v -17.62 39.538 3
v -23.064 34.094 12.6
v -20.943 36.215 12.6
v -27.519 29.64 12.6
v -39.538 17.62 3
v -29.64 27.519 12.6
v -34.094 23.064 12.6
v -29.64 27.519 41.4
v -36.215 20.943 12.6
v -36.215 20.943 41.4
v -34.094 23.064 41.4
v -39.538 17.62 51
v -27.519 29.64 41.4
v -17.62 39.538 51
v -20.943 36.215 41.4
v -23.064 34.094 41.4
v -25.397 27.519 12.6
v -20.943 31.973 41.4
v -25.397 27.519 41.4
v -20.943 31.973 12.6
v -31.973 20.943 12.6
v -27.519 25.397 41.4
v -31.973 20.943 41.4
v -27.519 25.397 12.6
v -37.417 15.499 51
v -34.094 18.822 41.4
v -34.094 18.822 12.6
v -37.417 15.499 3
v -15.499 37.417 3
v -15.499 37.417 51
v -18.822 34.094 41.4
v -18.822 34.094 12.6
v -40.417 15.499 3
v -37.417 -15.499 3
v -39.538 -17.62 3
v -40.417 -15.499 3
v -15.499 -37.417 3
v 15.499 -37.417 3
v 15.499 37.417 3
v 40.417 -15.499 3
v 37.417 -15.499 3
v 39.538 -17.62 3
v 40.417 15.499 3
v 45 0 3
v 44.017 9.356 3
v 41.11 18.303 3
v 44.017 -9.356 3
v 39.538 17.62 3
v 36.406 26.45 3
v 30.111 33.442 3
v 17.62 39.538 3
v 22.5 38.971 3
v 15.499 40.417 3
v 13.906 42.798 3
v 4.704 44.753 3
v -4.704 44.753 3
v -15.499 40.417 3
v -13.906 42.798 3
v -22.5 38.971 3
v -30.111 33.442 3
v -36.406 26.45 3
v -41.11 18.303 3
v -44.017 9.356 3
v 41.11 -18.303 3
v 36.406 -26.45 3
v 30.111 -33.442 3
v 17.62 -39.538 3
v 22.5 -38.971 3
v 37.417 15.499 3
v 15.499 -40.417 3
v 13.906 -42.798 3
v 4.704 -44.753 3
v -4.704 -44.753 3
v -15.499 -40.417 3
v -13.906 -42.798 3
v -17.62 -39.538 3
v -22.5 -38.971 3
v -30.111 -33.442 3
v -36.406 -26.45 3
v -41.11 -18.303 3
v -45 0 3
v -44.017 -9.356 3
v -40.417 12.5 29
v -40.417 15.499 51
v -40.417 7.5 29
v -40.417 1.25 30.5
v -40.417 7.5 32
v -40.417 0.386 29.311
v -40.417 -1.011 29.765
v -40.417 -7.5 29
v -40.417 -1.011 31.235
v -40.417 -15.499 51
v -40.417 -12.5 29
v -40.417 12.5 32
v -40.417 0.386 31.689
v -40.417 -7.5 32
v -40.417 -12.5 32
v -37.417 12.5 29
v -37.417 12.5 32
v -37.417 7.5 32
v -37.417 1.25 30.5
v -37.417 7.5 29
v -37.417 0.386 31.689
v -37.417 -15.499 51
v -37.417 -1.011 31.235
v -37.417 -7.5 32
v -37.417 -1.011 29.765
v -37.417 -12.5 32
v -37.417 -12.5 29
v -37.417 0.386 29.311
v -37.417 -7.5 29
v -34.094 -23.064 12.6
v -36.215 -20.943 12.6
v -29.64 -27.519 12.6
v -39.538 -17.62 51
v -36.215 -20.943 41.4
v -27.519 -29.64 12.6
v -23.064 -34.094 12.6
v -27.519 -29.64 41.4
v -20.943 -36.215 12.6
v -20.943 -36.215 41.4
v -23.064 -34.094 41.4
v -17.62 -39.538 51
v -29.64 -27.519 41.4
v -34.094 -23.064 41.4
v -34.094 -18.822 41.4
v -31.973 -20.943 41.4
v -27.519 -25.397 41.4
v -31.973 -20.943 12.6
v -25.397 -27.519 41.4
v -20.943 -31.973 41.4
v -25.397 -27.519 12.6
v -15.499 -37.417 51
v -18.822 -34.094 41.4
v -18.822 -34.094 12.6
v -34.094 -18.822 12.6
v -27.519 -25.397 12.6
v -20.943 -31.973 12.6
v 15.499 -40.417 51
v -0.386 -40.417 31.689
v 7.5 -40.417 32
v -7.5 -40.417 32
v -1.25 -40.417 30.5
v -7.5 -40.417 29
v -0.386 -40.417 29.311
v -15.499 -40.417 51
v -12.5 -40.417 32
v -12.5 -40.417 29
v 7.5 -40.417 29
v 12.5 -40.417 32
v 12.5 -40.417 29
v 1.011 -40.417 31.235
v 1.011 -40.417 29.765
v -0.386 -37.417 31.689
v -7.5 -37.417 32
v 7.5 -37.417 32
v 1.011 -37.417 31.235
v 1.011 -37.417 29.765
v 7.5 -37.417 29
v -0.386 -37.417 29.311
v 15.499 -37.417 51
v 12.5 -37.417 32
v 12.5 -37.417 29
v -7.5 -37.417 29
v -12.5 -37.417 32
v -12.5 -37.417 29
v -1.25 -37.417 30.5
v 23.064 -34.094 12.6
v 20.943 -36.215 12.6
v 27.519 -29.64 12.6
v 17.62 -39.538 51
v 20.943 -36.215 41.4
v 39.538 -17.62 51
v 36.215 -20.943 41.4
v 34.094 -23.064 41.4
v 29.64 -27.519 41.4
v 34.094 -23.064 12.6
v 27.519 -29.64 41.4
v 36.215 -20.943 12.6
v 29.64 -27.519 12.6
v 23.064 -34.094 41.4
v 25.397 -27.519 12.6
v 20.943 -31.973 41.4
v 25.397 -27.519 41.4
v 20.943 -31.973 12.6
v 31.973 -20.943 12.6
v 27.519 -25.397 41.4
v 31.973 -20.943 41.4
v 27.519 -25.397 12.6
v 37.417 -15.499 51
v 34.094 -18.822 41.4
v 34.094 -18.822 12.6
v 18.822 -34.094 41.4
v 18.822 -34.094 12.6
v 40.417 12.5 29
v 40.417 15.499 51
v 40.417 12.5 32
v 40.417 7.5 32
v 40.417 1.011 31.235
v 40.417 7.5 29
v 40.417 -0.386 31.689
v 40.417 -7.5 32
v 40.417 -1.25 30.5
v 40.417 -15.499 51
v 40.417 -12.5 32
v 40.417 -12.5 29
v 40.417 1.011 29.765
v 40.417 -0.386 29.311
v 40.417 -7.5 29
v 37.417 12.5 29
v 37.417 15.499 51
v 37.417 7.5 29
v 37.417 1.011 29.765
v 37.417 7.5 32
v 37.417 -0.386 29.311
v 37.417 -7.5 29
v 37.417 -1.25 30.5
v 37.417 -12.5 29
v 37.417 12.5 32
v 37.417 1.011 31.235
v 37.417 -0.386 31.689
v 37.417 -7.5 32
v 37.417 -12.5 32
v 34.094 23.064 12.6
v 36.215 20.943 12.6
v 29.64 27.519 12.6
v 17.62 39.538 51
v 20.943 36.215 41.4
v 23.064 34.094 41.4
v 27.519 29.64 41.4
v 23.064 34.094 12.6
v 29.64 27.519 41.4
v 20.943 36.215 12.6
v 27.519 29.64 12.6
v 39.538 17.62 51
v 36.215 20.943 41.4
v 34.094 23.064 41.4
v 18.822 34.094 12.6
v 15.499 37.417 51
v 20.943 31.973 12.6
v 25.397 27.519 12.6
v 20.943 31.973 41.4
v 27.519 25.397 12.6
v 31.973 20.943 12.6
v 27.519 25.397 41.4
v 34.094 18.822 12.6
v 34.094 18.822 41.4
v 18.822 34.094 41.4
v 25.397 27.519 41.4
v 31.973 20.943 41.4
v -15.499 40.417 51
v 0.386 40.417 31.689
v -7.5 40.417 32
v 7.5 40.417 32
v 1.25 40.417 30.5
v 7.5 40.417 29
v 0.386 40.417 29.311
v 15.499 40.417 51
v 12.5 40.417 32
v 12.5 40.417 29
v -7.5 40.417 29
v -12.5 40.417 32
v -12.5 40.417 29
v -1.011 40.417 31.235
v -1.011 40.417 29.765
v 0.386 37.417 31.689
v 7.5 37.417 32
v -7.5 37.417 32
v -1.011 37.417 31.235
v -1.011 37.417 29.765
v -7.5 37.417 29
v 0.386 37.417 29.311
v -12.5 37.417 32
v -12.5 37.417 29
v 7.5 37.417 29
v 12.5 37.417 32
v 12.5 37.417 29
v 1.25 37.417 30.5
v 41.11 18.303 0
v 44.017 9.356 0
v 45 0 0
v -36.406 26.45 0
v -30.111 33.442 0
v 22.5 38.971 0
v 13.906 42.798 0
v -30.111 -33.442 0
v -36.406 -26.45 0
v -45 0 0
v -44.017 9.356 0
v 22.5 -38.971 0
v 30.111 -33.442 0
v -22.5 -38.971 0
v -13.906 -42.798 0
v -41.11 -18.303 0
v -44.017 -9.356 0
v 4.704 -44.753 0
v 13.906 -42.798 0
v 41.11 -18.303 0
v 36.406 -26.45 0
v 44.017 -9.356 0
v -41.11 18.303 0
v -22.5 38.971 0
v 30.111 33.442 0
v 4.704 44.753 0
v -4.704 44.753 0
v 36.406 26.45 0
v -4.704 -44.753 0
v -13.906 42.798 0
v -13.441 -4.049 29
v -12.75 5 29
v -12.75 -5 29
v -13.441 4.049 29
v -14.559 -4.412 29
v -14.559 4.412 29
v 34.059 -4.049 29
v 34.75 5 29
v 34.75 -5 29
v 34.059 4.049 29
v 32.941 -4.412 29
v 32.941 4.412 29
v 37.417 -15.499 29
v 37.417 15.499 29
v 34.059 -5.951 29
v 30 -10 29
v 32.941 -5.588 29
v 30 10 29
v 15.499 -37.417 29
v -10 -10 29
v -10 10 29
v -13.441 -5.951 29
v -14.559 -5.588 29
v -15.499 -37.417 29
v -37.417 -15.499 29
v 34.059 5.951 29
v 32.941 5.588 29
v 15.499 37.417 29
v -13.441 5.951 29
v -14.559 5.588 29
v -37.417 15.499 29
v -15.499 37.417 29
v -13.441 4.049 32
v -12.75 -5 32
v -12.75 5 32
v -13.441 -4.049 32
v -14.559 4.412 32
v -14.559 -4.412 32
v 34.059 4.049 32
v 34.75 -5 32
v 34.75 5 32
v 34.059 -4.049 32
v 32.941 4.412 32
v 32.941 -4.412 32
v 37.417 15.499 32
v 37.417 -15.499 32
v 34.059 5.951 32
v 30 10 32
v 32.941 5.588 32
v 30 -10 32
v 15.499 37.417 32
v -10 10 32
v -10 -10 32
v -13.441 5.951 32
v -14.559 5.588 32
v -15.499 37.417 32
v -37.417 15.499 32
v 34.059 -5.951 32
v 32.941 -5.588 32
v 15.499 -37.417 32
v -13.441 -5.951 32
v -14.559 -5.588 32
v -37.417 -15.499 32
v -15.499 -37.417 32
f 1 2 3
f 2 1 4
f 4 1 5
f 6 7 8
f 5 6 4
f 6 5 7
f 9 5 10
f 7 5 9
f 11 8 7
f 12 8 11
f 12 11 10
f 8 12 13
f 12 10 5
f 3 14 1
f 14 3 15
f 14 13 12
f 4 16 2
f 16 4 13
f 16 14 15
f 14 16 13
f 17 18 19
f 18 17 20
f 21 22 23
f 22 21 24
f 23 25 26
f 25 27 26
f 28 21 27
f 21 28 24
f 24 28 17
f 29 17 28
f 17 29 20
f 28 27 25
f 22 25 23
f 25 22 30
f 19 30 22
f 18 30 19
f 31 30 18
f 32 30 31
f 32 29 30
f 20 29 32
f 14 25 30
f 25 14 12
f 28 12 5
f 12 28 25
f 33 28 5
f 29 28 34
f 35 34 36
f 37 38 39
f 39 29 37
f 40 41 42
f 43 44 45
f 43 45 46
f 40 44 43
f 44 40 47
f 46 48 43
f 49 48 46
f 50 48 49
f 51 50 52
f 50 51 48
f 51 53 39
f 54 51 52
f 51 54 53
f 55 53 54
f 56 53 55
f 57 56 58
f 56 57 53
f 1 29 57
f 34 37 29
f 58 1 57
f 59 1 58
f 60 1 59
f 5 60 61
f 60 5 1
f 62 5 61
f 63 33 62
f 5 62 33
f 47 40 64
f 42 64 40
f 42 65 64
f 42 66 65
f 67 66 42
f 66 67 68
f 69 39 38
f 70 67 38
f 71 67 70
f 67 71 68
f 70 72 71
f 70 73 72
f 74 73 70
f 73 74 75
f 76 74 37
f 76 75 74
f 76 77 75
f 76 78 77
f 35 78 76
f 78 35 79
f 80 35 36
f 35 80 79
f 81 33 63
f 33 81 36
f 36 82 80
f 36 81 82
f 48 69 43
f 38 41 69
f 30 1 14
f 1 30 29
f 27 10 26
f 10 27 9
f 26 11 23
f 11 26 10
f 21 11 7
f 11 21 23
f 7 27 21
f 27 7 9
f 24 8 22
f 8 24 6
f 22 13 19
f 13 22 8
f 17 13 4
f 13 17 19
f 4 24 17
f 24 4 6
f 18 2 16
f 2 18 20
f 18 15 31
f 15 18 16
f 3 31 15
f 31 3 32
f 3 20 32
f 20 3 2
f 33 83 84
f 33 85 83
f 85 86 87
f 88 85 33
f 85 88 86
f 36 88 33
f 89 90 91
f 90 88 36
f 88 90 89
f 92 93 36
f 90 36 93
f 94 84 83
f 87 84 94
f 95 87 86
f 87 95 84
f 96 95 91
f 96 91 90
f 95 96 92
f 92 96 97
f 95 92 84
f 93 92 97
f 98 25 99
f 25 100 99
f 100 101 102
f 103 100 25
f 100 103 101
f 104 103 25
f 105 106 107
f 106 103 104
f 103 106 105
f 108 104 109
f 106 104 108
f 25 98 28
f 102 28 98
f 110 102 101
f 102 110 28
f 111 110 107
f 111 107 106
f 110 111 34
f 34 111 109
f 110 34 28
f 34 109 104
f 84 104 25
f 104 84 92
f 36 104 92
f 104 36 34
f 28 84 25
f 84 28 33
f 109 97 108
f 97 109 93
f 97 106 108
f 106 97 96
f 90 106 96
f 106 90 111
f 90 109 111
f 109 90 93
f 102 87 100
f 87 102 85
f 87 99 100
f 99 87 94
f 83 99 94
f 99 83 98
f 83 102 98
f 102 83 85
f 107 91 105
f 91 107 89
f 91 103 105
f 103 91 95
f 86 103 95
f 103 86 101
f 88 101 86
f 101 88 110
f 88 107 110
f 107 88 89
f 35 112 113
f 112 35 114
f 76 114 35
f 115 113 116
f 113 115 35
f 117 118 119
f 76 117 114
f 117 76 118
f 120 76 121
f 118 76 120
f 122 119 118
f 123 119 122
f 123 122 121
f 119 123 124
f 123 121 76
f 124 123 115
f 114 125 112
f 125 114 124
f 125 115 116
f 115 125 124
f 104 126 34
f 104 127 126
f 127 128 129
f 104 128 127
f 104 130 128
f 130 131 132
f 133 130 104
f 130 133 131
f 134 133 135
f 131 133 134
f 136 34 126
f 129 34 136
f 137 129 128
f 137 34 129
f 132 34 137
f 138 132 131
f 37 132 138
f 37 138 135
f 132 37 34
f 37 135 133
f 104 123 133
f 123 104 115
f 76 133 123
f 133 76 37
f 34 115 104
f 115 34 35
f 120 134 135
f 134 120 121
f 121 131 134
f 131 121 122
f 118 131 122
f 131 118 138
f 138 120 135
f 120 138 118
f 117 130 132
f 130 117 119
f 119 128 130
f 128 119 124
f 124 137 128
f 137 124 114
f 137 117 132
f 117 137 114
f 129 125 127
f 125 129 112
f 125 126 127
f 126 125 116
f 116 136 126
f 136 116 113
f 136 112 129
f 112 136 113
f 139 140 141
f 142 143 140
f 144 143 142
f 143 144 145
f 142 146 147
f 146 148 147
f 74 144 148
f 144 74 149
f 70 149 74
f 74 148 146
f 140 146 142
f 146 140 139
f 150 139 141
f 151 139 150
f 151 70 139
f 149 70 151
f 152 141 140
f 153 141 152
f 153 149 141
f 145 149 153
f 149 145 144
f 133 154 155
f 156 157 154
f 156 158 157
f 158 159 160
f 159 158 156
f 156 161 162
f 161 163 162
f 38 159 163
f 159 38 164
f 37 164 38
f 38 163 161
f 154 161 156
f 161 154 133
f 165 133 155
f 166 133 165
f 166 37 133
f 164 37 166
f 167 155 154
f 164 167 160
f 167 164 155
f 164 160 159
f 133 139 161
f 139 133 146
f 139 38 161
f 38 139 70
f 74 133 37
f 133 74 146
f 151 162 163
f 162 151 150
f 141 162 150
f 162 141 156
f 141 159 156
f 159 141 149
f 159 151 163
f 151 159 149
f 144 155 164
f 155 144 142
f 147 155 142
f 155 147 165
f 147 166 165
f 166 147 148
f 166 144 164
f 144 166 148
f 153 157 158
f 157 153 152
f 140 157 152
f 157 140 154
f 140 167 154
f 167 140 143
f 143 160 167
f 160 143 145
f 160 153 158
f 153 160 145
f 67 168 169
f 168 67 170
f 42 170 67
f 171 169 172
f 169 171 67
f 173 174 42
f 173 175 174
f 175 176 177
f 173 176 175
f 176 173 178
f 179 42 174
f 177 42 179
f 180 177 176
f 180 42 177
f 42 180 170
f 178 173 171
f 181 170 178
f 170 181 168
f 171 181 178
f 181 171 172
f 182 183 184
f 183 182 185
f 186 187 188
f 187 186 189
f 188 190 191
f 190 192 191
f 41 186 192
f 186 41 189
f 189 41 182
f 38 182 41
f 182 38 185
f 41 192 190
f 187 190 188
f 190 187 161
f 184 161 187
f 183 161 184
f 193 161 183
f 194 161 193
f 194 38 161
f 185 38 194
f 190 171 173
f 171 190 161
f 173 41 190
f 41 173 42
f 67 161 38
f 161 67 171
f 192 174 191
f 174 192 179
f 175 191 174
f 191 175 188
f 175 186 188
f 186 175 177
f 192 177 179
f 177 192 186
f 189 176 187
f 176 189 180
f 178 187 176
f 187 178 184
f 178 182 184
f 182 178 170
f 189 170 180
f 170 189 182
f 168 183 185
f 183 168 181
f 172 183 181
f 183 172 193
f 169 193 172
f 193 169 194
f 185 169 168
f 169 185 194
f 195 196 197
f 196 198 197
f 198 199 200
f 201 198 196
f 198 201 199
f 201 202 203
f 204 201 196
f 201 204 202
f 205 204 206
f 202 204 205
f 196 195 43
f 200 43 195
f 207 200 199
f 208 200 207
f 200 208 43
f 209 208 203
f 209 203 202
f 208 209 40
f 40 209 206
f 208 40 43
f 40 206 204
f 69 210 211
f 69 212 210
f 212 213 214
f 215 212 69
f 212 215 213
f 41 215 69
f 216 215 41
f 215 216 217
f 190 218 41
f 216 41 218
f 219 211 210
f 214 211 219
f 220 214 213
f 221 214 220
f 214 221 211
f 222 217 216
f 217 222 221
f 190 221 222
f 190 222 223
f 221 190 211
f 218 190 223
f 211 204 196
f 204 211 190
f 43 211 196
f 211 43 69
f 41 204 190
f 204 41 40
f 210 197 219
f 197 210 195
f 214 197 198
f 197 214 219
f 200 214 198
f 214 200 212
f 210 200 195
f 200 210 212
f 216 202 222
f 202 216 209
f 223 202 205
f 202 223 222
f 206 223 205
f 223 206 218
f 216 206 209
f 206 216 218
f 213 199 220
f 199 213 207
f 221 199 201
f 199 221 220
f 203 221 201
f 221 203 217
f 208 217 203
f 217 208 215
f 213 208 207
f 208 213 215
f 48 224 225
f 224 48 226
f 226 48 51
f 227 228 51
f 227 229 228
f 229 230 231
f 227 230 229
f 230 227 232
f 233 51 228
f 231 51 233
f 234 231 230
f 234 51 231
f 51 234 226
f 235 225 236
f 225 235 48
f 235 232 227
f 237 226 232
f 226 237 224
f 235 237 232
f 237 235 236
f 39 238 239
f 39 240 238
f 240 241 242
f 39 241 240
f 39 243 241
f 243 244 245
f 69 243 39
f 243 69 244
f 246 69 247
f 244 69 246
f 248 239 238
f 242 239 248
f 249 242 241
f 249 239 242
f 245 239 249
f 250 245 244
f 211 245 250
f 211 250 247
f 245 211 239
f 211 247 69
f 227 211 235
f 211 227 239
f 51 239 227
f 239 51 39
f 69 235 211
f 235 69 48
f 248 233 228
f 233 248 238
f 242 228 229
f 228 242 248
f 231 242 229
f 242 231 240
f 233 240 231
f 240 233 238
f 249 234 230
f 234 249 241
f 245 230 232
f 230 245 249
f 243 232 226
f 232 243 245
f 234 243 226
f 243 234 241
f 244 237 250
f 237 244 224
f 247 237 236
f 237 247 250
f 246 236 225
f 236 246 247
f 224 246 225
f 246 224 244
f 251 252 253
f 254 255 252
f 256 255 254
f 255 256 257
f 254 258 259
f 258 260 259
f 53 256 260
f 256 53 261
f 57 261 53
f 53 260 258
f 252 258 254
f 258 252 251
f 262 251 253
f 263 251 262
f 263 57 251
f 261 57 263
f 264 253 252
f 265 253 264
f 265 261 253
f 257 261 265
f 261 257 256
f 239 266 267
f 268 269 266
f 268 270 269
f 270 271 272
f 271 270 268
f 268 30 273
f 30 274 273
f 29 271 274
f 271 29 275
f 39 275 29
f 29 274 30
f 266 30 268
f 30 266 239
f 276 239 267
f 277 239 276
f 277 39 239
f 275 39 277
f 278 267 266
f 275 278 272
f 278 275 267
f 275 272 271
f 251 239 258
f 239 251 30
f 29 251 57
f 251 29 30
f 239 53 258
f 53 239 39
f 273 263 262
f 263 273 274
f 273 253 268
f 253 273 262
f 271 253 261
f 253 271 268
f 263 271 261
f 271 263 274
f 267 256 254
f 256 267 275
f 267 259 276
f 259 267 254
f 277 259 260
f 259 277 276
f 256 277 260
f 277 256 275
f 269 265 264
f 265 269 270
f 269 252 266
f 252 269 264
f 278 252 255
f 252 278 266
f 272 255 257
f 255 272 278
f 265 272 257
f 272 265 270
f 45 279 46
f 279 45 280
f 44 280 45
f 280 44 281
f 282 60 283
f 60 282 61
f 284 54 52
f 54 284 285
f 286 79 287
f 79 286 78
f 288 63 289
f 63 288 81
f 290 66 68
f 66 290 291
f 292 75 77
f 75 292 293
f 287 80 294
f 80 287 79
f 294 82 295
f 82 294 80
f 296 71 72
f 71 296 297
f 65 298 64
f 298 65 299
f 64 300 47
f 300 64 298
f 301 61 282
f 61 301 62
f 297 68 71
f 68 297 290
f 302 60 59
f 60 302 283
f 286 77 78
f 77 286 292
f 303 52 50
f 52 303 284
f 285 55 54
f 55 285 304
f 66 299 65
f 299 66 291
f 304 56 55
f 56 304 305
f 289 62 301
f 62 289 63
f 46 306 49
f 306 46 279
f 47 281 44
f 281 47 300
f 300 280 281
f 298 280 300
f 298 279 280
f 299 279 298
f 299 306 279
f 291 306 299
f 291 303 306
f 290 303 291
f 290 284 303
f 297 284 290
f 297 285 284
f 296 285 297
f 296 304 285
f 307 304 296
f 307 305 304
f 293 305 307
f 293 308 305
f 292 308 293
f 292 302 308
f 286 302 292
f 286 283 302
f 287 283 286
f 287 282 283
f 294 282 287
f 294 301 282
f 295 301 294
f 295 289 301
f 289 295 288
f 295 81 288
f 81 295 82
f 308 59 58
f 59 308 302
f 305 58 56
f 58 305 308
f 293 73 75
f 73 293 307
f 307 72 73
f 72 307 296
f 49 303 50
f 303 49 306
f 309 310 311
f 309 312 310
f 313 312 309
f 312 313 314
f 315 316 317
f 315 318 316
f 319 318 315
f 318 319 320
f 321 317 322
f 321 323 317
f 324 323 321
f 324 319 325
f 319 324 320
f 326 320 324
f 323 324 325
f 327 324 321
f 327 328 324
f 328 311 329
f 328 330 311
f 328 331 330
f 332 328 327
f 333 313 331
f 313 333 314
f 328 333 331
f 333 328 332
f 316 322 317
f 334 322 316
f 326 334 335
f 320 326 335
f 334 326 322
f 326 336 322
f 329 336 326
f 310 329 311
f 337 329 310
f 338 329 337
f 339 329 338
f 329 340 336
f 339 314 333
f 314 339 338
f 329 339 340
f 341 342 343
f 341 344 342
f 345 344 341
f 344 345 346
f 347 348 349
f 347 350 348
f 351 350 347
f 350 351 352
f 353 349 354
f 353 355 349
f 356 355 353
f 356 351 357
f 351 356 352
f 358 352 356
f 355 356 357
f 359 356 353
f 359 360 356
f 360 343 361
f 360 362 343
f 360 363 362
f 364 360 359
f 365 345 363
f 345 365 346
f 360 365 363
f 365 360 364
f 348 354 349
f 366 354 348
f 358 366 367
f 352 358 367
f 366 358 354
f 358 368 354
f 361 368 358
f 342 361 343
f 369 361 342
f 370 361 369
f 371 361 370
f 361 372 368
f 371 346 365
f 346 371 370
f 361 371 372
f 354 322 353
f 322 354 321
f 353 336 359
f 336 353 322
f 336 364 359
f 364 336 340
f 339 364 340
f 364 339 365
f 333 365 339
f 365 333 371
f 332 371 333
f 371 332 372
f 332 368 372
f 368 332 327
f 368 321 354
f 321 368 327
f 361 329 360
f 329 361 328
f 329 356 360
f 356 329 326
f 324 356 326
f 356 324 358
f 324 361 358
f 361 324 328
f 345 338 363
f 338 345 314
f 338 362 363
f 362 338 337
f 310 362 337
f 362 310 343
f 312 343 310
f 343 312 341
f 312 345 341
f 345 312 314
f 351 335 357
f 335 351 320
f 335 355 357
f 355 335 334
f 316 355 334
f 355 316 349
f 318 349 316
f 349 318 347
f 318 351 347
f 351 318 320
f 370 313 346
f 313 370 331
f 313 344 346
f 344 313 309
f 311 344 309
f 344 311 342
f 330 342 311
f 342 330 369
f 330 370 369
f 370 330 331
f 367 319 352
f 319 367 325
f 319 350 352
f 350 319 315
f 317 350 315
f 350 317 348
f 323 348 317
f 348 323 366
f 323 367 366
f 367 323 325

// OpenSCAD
// file: ../connectors/captive_nut.scad
module nut_slot() {
    
}

module bolt_slot(height, width, translation, circle_dia) {
    circle(d=circle_dia);
    for (i = [-1:2:1]) {
        translate([i*translation, 0, 0]) square([width, height], center=true);
    }
}

bolt_slot(3, 5, 10, 2.5);
// file: side_plate.scad
use <../connectors/captive_nut.scad>

// Side plates for the base

air_holes_length = 0.6; // percentage of total length for holes
air_holes_width = 0.6; // percentage of plate width for holes
air_holes_thickness = 3; // width of holes

module side_plate(tk, width, height, num_plates, air_holes_num, servo_height) {
    height = height - tk;
    air_holes_num = air_holes_num - 1;
    linear_extrude(tk) difference() {
        square([width, height], center = false);

        if (air_holes_num > 0) {
            start = width * (1 - air_holes_width) / 2;
            end = start + width * air_holes_width;
            vertical_offset = height / 2;
    
            for (i = [start:(end-start)/air_holes_num:end + 1]) {
                translate([i, vertical_offset])
                square([air_holes_thickness, height*air_holes_length], center = true);
            }
        } else {
            translate([width/2, servo_height, 0]) bolt_slot(tk, 5, 10, 2.5);
        }
    }
}

side_plate(3, 90, 70, 8, 0, 40);
// file: middle_base_plate.scad
use <../connectors/captive_nut.scad>

module middle_base_plate(tk, num_plates, diameter, hole_length, hole_width, shaft_offset, servo_length, screw_diameter) {
    echo(concat(tk, num_plates, diameter, hole_length, hole_width, shaft_offset, servo_length, screw_diameter));
    linear_extrude(3) difference() {
        rotate([0,0,360/num_plates/2]) circle(d=diameter, $fn=num_plates);
        translate([shaft_offset, 0, 0]) square([hole_length, hole_width], center=true);
        for (i = [-1:2:1]) {
            for (j = [-1:2:1]) {
                translate([shaft_offset + i*hole_length/2 + i*(servo_length - hole_length)/4, j*hole_width/4]) circle(d=screw_diameter);
            }
        }
    }
}

middle_base_plate(3, 8, 81, 40, 20, 10, 55, 3);
// file: top_base_plate.scad
// Top base plate

module top_base_plate(tk, dia) {
    linear_extrude(tk) circle(d=dia);
}
// file: bottom_base_plate.scad
// Bottom base plate

module bottom_base_plate(tk, dia) {
    linear_extrude(tk) circle(d=dia);
}
// main file
use <bottom_base_plate.scad>
use <top_base_plate.scad>
use <middle_base_plate.scad>
use <side_plate.scad>

height_offset = 10;
side_plate_diameter_offset = 0.9; // percentage offset of interior plates

module base(plate, tk, diameter, servo, num_plates, air_holes_num, bolt_diameter) {
    if (plate) {
        projection() {
            bottom_base_plate(tk, diameter);
            translate([100, 0, 0]) top_base_plate(tk, diameter);
        }
    } else {
        plate_height = servo[0] + height_offset;
        side_plate_width = sin(180/num_plates) * diameter * side_plate_diameter_offset;
        side_plate_offset = cos(180/num_plates) * diameter * side_plate_diameter_offset /2 + tk;
        
        bottom_base_plate(tk, diameter); // place bottom plate
        
        for (i = [1:num_plates]) {
            rotate([0,0,360/num_plates*i])
            translate([-side_plate_width/2,side_plate_offset,tk])
            rotate([90,0,0])
            if (floor(i/2) == i/2) {
                // if even
                side_plate(tk, side_plate_width, plate_height, num_plates, 0, servo[5] + tk/2);
            } else {
                // if odd
                side_plate(tk, side_plate_width, plate_height, num_plates, air_holes_num, servo[5]);
            }
        }
        
        translate([0, 0, servo[5] + tk]) {
            middle_base_plate(tk, num_plates, side_plate_diameter_offset*diameter, servo[1], servo[3], servo[6], servo[4], bolt_diameter);
        }
        
//        translate([0, 0, plate_height]) {
//            top_base_plate(tk, diameter);
//        }
    }
}

base(false, 3, 90, [41, 40, 37, 20, 55, 26, 10], 8, 3);
